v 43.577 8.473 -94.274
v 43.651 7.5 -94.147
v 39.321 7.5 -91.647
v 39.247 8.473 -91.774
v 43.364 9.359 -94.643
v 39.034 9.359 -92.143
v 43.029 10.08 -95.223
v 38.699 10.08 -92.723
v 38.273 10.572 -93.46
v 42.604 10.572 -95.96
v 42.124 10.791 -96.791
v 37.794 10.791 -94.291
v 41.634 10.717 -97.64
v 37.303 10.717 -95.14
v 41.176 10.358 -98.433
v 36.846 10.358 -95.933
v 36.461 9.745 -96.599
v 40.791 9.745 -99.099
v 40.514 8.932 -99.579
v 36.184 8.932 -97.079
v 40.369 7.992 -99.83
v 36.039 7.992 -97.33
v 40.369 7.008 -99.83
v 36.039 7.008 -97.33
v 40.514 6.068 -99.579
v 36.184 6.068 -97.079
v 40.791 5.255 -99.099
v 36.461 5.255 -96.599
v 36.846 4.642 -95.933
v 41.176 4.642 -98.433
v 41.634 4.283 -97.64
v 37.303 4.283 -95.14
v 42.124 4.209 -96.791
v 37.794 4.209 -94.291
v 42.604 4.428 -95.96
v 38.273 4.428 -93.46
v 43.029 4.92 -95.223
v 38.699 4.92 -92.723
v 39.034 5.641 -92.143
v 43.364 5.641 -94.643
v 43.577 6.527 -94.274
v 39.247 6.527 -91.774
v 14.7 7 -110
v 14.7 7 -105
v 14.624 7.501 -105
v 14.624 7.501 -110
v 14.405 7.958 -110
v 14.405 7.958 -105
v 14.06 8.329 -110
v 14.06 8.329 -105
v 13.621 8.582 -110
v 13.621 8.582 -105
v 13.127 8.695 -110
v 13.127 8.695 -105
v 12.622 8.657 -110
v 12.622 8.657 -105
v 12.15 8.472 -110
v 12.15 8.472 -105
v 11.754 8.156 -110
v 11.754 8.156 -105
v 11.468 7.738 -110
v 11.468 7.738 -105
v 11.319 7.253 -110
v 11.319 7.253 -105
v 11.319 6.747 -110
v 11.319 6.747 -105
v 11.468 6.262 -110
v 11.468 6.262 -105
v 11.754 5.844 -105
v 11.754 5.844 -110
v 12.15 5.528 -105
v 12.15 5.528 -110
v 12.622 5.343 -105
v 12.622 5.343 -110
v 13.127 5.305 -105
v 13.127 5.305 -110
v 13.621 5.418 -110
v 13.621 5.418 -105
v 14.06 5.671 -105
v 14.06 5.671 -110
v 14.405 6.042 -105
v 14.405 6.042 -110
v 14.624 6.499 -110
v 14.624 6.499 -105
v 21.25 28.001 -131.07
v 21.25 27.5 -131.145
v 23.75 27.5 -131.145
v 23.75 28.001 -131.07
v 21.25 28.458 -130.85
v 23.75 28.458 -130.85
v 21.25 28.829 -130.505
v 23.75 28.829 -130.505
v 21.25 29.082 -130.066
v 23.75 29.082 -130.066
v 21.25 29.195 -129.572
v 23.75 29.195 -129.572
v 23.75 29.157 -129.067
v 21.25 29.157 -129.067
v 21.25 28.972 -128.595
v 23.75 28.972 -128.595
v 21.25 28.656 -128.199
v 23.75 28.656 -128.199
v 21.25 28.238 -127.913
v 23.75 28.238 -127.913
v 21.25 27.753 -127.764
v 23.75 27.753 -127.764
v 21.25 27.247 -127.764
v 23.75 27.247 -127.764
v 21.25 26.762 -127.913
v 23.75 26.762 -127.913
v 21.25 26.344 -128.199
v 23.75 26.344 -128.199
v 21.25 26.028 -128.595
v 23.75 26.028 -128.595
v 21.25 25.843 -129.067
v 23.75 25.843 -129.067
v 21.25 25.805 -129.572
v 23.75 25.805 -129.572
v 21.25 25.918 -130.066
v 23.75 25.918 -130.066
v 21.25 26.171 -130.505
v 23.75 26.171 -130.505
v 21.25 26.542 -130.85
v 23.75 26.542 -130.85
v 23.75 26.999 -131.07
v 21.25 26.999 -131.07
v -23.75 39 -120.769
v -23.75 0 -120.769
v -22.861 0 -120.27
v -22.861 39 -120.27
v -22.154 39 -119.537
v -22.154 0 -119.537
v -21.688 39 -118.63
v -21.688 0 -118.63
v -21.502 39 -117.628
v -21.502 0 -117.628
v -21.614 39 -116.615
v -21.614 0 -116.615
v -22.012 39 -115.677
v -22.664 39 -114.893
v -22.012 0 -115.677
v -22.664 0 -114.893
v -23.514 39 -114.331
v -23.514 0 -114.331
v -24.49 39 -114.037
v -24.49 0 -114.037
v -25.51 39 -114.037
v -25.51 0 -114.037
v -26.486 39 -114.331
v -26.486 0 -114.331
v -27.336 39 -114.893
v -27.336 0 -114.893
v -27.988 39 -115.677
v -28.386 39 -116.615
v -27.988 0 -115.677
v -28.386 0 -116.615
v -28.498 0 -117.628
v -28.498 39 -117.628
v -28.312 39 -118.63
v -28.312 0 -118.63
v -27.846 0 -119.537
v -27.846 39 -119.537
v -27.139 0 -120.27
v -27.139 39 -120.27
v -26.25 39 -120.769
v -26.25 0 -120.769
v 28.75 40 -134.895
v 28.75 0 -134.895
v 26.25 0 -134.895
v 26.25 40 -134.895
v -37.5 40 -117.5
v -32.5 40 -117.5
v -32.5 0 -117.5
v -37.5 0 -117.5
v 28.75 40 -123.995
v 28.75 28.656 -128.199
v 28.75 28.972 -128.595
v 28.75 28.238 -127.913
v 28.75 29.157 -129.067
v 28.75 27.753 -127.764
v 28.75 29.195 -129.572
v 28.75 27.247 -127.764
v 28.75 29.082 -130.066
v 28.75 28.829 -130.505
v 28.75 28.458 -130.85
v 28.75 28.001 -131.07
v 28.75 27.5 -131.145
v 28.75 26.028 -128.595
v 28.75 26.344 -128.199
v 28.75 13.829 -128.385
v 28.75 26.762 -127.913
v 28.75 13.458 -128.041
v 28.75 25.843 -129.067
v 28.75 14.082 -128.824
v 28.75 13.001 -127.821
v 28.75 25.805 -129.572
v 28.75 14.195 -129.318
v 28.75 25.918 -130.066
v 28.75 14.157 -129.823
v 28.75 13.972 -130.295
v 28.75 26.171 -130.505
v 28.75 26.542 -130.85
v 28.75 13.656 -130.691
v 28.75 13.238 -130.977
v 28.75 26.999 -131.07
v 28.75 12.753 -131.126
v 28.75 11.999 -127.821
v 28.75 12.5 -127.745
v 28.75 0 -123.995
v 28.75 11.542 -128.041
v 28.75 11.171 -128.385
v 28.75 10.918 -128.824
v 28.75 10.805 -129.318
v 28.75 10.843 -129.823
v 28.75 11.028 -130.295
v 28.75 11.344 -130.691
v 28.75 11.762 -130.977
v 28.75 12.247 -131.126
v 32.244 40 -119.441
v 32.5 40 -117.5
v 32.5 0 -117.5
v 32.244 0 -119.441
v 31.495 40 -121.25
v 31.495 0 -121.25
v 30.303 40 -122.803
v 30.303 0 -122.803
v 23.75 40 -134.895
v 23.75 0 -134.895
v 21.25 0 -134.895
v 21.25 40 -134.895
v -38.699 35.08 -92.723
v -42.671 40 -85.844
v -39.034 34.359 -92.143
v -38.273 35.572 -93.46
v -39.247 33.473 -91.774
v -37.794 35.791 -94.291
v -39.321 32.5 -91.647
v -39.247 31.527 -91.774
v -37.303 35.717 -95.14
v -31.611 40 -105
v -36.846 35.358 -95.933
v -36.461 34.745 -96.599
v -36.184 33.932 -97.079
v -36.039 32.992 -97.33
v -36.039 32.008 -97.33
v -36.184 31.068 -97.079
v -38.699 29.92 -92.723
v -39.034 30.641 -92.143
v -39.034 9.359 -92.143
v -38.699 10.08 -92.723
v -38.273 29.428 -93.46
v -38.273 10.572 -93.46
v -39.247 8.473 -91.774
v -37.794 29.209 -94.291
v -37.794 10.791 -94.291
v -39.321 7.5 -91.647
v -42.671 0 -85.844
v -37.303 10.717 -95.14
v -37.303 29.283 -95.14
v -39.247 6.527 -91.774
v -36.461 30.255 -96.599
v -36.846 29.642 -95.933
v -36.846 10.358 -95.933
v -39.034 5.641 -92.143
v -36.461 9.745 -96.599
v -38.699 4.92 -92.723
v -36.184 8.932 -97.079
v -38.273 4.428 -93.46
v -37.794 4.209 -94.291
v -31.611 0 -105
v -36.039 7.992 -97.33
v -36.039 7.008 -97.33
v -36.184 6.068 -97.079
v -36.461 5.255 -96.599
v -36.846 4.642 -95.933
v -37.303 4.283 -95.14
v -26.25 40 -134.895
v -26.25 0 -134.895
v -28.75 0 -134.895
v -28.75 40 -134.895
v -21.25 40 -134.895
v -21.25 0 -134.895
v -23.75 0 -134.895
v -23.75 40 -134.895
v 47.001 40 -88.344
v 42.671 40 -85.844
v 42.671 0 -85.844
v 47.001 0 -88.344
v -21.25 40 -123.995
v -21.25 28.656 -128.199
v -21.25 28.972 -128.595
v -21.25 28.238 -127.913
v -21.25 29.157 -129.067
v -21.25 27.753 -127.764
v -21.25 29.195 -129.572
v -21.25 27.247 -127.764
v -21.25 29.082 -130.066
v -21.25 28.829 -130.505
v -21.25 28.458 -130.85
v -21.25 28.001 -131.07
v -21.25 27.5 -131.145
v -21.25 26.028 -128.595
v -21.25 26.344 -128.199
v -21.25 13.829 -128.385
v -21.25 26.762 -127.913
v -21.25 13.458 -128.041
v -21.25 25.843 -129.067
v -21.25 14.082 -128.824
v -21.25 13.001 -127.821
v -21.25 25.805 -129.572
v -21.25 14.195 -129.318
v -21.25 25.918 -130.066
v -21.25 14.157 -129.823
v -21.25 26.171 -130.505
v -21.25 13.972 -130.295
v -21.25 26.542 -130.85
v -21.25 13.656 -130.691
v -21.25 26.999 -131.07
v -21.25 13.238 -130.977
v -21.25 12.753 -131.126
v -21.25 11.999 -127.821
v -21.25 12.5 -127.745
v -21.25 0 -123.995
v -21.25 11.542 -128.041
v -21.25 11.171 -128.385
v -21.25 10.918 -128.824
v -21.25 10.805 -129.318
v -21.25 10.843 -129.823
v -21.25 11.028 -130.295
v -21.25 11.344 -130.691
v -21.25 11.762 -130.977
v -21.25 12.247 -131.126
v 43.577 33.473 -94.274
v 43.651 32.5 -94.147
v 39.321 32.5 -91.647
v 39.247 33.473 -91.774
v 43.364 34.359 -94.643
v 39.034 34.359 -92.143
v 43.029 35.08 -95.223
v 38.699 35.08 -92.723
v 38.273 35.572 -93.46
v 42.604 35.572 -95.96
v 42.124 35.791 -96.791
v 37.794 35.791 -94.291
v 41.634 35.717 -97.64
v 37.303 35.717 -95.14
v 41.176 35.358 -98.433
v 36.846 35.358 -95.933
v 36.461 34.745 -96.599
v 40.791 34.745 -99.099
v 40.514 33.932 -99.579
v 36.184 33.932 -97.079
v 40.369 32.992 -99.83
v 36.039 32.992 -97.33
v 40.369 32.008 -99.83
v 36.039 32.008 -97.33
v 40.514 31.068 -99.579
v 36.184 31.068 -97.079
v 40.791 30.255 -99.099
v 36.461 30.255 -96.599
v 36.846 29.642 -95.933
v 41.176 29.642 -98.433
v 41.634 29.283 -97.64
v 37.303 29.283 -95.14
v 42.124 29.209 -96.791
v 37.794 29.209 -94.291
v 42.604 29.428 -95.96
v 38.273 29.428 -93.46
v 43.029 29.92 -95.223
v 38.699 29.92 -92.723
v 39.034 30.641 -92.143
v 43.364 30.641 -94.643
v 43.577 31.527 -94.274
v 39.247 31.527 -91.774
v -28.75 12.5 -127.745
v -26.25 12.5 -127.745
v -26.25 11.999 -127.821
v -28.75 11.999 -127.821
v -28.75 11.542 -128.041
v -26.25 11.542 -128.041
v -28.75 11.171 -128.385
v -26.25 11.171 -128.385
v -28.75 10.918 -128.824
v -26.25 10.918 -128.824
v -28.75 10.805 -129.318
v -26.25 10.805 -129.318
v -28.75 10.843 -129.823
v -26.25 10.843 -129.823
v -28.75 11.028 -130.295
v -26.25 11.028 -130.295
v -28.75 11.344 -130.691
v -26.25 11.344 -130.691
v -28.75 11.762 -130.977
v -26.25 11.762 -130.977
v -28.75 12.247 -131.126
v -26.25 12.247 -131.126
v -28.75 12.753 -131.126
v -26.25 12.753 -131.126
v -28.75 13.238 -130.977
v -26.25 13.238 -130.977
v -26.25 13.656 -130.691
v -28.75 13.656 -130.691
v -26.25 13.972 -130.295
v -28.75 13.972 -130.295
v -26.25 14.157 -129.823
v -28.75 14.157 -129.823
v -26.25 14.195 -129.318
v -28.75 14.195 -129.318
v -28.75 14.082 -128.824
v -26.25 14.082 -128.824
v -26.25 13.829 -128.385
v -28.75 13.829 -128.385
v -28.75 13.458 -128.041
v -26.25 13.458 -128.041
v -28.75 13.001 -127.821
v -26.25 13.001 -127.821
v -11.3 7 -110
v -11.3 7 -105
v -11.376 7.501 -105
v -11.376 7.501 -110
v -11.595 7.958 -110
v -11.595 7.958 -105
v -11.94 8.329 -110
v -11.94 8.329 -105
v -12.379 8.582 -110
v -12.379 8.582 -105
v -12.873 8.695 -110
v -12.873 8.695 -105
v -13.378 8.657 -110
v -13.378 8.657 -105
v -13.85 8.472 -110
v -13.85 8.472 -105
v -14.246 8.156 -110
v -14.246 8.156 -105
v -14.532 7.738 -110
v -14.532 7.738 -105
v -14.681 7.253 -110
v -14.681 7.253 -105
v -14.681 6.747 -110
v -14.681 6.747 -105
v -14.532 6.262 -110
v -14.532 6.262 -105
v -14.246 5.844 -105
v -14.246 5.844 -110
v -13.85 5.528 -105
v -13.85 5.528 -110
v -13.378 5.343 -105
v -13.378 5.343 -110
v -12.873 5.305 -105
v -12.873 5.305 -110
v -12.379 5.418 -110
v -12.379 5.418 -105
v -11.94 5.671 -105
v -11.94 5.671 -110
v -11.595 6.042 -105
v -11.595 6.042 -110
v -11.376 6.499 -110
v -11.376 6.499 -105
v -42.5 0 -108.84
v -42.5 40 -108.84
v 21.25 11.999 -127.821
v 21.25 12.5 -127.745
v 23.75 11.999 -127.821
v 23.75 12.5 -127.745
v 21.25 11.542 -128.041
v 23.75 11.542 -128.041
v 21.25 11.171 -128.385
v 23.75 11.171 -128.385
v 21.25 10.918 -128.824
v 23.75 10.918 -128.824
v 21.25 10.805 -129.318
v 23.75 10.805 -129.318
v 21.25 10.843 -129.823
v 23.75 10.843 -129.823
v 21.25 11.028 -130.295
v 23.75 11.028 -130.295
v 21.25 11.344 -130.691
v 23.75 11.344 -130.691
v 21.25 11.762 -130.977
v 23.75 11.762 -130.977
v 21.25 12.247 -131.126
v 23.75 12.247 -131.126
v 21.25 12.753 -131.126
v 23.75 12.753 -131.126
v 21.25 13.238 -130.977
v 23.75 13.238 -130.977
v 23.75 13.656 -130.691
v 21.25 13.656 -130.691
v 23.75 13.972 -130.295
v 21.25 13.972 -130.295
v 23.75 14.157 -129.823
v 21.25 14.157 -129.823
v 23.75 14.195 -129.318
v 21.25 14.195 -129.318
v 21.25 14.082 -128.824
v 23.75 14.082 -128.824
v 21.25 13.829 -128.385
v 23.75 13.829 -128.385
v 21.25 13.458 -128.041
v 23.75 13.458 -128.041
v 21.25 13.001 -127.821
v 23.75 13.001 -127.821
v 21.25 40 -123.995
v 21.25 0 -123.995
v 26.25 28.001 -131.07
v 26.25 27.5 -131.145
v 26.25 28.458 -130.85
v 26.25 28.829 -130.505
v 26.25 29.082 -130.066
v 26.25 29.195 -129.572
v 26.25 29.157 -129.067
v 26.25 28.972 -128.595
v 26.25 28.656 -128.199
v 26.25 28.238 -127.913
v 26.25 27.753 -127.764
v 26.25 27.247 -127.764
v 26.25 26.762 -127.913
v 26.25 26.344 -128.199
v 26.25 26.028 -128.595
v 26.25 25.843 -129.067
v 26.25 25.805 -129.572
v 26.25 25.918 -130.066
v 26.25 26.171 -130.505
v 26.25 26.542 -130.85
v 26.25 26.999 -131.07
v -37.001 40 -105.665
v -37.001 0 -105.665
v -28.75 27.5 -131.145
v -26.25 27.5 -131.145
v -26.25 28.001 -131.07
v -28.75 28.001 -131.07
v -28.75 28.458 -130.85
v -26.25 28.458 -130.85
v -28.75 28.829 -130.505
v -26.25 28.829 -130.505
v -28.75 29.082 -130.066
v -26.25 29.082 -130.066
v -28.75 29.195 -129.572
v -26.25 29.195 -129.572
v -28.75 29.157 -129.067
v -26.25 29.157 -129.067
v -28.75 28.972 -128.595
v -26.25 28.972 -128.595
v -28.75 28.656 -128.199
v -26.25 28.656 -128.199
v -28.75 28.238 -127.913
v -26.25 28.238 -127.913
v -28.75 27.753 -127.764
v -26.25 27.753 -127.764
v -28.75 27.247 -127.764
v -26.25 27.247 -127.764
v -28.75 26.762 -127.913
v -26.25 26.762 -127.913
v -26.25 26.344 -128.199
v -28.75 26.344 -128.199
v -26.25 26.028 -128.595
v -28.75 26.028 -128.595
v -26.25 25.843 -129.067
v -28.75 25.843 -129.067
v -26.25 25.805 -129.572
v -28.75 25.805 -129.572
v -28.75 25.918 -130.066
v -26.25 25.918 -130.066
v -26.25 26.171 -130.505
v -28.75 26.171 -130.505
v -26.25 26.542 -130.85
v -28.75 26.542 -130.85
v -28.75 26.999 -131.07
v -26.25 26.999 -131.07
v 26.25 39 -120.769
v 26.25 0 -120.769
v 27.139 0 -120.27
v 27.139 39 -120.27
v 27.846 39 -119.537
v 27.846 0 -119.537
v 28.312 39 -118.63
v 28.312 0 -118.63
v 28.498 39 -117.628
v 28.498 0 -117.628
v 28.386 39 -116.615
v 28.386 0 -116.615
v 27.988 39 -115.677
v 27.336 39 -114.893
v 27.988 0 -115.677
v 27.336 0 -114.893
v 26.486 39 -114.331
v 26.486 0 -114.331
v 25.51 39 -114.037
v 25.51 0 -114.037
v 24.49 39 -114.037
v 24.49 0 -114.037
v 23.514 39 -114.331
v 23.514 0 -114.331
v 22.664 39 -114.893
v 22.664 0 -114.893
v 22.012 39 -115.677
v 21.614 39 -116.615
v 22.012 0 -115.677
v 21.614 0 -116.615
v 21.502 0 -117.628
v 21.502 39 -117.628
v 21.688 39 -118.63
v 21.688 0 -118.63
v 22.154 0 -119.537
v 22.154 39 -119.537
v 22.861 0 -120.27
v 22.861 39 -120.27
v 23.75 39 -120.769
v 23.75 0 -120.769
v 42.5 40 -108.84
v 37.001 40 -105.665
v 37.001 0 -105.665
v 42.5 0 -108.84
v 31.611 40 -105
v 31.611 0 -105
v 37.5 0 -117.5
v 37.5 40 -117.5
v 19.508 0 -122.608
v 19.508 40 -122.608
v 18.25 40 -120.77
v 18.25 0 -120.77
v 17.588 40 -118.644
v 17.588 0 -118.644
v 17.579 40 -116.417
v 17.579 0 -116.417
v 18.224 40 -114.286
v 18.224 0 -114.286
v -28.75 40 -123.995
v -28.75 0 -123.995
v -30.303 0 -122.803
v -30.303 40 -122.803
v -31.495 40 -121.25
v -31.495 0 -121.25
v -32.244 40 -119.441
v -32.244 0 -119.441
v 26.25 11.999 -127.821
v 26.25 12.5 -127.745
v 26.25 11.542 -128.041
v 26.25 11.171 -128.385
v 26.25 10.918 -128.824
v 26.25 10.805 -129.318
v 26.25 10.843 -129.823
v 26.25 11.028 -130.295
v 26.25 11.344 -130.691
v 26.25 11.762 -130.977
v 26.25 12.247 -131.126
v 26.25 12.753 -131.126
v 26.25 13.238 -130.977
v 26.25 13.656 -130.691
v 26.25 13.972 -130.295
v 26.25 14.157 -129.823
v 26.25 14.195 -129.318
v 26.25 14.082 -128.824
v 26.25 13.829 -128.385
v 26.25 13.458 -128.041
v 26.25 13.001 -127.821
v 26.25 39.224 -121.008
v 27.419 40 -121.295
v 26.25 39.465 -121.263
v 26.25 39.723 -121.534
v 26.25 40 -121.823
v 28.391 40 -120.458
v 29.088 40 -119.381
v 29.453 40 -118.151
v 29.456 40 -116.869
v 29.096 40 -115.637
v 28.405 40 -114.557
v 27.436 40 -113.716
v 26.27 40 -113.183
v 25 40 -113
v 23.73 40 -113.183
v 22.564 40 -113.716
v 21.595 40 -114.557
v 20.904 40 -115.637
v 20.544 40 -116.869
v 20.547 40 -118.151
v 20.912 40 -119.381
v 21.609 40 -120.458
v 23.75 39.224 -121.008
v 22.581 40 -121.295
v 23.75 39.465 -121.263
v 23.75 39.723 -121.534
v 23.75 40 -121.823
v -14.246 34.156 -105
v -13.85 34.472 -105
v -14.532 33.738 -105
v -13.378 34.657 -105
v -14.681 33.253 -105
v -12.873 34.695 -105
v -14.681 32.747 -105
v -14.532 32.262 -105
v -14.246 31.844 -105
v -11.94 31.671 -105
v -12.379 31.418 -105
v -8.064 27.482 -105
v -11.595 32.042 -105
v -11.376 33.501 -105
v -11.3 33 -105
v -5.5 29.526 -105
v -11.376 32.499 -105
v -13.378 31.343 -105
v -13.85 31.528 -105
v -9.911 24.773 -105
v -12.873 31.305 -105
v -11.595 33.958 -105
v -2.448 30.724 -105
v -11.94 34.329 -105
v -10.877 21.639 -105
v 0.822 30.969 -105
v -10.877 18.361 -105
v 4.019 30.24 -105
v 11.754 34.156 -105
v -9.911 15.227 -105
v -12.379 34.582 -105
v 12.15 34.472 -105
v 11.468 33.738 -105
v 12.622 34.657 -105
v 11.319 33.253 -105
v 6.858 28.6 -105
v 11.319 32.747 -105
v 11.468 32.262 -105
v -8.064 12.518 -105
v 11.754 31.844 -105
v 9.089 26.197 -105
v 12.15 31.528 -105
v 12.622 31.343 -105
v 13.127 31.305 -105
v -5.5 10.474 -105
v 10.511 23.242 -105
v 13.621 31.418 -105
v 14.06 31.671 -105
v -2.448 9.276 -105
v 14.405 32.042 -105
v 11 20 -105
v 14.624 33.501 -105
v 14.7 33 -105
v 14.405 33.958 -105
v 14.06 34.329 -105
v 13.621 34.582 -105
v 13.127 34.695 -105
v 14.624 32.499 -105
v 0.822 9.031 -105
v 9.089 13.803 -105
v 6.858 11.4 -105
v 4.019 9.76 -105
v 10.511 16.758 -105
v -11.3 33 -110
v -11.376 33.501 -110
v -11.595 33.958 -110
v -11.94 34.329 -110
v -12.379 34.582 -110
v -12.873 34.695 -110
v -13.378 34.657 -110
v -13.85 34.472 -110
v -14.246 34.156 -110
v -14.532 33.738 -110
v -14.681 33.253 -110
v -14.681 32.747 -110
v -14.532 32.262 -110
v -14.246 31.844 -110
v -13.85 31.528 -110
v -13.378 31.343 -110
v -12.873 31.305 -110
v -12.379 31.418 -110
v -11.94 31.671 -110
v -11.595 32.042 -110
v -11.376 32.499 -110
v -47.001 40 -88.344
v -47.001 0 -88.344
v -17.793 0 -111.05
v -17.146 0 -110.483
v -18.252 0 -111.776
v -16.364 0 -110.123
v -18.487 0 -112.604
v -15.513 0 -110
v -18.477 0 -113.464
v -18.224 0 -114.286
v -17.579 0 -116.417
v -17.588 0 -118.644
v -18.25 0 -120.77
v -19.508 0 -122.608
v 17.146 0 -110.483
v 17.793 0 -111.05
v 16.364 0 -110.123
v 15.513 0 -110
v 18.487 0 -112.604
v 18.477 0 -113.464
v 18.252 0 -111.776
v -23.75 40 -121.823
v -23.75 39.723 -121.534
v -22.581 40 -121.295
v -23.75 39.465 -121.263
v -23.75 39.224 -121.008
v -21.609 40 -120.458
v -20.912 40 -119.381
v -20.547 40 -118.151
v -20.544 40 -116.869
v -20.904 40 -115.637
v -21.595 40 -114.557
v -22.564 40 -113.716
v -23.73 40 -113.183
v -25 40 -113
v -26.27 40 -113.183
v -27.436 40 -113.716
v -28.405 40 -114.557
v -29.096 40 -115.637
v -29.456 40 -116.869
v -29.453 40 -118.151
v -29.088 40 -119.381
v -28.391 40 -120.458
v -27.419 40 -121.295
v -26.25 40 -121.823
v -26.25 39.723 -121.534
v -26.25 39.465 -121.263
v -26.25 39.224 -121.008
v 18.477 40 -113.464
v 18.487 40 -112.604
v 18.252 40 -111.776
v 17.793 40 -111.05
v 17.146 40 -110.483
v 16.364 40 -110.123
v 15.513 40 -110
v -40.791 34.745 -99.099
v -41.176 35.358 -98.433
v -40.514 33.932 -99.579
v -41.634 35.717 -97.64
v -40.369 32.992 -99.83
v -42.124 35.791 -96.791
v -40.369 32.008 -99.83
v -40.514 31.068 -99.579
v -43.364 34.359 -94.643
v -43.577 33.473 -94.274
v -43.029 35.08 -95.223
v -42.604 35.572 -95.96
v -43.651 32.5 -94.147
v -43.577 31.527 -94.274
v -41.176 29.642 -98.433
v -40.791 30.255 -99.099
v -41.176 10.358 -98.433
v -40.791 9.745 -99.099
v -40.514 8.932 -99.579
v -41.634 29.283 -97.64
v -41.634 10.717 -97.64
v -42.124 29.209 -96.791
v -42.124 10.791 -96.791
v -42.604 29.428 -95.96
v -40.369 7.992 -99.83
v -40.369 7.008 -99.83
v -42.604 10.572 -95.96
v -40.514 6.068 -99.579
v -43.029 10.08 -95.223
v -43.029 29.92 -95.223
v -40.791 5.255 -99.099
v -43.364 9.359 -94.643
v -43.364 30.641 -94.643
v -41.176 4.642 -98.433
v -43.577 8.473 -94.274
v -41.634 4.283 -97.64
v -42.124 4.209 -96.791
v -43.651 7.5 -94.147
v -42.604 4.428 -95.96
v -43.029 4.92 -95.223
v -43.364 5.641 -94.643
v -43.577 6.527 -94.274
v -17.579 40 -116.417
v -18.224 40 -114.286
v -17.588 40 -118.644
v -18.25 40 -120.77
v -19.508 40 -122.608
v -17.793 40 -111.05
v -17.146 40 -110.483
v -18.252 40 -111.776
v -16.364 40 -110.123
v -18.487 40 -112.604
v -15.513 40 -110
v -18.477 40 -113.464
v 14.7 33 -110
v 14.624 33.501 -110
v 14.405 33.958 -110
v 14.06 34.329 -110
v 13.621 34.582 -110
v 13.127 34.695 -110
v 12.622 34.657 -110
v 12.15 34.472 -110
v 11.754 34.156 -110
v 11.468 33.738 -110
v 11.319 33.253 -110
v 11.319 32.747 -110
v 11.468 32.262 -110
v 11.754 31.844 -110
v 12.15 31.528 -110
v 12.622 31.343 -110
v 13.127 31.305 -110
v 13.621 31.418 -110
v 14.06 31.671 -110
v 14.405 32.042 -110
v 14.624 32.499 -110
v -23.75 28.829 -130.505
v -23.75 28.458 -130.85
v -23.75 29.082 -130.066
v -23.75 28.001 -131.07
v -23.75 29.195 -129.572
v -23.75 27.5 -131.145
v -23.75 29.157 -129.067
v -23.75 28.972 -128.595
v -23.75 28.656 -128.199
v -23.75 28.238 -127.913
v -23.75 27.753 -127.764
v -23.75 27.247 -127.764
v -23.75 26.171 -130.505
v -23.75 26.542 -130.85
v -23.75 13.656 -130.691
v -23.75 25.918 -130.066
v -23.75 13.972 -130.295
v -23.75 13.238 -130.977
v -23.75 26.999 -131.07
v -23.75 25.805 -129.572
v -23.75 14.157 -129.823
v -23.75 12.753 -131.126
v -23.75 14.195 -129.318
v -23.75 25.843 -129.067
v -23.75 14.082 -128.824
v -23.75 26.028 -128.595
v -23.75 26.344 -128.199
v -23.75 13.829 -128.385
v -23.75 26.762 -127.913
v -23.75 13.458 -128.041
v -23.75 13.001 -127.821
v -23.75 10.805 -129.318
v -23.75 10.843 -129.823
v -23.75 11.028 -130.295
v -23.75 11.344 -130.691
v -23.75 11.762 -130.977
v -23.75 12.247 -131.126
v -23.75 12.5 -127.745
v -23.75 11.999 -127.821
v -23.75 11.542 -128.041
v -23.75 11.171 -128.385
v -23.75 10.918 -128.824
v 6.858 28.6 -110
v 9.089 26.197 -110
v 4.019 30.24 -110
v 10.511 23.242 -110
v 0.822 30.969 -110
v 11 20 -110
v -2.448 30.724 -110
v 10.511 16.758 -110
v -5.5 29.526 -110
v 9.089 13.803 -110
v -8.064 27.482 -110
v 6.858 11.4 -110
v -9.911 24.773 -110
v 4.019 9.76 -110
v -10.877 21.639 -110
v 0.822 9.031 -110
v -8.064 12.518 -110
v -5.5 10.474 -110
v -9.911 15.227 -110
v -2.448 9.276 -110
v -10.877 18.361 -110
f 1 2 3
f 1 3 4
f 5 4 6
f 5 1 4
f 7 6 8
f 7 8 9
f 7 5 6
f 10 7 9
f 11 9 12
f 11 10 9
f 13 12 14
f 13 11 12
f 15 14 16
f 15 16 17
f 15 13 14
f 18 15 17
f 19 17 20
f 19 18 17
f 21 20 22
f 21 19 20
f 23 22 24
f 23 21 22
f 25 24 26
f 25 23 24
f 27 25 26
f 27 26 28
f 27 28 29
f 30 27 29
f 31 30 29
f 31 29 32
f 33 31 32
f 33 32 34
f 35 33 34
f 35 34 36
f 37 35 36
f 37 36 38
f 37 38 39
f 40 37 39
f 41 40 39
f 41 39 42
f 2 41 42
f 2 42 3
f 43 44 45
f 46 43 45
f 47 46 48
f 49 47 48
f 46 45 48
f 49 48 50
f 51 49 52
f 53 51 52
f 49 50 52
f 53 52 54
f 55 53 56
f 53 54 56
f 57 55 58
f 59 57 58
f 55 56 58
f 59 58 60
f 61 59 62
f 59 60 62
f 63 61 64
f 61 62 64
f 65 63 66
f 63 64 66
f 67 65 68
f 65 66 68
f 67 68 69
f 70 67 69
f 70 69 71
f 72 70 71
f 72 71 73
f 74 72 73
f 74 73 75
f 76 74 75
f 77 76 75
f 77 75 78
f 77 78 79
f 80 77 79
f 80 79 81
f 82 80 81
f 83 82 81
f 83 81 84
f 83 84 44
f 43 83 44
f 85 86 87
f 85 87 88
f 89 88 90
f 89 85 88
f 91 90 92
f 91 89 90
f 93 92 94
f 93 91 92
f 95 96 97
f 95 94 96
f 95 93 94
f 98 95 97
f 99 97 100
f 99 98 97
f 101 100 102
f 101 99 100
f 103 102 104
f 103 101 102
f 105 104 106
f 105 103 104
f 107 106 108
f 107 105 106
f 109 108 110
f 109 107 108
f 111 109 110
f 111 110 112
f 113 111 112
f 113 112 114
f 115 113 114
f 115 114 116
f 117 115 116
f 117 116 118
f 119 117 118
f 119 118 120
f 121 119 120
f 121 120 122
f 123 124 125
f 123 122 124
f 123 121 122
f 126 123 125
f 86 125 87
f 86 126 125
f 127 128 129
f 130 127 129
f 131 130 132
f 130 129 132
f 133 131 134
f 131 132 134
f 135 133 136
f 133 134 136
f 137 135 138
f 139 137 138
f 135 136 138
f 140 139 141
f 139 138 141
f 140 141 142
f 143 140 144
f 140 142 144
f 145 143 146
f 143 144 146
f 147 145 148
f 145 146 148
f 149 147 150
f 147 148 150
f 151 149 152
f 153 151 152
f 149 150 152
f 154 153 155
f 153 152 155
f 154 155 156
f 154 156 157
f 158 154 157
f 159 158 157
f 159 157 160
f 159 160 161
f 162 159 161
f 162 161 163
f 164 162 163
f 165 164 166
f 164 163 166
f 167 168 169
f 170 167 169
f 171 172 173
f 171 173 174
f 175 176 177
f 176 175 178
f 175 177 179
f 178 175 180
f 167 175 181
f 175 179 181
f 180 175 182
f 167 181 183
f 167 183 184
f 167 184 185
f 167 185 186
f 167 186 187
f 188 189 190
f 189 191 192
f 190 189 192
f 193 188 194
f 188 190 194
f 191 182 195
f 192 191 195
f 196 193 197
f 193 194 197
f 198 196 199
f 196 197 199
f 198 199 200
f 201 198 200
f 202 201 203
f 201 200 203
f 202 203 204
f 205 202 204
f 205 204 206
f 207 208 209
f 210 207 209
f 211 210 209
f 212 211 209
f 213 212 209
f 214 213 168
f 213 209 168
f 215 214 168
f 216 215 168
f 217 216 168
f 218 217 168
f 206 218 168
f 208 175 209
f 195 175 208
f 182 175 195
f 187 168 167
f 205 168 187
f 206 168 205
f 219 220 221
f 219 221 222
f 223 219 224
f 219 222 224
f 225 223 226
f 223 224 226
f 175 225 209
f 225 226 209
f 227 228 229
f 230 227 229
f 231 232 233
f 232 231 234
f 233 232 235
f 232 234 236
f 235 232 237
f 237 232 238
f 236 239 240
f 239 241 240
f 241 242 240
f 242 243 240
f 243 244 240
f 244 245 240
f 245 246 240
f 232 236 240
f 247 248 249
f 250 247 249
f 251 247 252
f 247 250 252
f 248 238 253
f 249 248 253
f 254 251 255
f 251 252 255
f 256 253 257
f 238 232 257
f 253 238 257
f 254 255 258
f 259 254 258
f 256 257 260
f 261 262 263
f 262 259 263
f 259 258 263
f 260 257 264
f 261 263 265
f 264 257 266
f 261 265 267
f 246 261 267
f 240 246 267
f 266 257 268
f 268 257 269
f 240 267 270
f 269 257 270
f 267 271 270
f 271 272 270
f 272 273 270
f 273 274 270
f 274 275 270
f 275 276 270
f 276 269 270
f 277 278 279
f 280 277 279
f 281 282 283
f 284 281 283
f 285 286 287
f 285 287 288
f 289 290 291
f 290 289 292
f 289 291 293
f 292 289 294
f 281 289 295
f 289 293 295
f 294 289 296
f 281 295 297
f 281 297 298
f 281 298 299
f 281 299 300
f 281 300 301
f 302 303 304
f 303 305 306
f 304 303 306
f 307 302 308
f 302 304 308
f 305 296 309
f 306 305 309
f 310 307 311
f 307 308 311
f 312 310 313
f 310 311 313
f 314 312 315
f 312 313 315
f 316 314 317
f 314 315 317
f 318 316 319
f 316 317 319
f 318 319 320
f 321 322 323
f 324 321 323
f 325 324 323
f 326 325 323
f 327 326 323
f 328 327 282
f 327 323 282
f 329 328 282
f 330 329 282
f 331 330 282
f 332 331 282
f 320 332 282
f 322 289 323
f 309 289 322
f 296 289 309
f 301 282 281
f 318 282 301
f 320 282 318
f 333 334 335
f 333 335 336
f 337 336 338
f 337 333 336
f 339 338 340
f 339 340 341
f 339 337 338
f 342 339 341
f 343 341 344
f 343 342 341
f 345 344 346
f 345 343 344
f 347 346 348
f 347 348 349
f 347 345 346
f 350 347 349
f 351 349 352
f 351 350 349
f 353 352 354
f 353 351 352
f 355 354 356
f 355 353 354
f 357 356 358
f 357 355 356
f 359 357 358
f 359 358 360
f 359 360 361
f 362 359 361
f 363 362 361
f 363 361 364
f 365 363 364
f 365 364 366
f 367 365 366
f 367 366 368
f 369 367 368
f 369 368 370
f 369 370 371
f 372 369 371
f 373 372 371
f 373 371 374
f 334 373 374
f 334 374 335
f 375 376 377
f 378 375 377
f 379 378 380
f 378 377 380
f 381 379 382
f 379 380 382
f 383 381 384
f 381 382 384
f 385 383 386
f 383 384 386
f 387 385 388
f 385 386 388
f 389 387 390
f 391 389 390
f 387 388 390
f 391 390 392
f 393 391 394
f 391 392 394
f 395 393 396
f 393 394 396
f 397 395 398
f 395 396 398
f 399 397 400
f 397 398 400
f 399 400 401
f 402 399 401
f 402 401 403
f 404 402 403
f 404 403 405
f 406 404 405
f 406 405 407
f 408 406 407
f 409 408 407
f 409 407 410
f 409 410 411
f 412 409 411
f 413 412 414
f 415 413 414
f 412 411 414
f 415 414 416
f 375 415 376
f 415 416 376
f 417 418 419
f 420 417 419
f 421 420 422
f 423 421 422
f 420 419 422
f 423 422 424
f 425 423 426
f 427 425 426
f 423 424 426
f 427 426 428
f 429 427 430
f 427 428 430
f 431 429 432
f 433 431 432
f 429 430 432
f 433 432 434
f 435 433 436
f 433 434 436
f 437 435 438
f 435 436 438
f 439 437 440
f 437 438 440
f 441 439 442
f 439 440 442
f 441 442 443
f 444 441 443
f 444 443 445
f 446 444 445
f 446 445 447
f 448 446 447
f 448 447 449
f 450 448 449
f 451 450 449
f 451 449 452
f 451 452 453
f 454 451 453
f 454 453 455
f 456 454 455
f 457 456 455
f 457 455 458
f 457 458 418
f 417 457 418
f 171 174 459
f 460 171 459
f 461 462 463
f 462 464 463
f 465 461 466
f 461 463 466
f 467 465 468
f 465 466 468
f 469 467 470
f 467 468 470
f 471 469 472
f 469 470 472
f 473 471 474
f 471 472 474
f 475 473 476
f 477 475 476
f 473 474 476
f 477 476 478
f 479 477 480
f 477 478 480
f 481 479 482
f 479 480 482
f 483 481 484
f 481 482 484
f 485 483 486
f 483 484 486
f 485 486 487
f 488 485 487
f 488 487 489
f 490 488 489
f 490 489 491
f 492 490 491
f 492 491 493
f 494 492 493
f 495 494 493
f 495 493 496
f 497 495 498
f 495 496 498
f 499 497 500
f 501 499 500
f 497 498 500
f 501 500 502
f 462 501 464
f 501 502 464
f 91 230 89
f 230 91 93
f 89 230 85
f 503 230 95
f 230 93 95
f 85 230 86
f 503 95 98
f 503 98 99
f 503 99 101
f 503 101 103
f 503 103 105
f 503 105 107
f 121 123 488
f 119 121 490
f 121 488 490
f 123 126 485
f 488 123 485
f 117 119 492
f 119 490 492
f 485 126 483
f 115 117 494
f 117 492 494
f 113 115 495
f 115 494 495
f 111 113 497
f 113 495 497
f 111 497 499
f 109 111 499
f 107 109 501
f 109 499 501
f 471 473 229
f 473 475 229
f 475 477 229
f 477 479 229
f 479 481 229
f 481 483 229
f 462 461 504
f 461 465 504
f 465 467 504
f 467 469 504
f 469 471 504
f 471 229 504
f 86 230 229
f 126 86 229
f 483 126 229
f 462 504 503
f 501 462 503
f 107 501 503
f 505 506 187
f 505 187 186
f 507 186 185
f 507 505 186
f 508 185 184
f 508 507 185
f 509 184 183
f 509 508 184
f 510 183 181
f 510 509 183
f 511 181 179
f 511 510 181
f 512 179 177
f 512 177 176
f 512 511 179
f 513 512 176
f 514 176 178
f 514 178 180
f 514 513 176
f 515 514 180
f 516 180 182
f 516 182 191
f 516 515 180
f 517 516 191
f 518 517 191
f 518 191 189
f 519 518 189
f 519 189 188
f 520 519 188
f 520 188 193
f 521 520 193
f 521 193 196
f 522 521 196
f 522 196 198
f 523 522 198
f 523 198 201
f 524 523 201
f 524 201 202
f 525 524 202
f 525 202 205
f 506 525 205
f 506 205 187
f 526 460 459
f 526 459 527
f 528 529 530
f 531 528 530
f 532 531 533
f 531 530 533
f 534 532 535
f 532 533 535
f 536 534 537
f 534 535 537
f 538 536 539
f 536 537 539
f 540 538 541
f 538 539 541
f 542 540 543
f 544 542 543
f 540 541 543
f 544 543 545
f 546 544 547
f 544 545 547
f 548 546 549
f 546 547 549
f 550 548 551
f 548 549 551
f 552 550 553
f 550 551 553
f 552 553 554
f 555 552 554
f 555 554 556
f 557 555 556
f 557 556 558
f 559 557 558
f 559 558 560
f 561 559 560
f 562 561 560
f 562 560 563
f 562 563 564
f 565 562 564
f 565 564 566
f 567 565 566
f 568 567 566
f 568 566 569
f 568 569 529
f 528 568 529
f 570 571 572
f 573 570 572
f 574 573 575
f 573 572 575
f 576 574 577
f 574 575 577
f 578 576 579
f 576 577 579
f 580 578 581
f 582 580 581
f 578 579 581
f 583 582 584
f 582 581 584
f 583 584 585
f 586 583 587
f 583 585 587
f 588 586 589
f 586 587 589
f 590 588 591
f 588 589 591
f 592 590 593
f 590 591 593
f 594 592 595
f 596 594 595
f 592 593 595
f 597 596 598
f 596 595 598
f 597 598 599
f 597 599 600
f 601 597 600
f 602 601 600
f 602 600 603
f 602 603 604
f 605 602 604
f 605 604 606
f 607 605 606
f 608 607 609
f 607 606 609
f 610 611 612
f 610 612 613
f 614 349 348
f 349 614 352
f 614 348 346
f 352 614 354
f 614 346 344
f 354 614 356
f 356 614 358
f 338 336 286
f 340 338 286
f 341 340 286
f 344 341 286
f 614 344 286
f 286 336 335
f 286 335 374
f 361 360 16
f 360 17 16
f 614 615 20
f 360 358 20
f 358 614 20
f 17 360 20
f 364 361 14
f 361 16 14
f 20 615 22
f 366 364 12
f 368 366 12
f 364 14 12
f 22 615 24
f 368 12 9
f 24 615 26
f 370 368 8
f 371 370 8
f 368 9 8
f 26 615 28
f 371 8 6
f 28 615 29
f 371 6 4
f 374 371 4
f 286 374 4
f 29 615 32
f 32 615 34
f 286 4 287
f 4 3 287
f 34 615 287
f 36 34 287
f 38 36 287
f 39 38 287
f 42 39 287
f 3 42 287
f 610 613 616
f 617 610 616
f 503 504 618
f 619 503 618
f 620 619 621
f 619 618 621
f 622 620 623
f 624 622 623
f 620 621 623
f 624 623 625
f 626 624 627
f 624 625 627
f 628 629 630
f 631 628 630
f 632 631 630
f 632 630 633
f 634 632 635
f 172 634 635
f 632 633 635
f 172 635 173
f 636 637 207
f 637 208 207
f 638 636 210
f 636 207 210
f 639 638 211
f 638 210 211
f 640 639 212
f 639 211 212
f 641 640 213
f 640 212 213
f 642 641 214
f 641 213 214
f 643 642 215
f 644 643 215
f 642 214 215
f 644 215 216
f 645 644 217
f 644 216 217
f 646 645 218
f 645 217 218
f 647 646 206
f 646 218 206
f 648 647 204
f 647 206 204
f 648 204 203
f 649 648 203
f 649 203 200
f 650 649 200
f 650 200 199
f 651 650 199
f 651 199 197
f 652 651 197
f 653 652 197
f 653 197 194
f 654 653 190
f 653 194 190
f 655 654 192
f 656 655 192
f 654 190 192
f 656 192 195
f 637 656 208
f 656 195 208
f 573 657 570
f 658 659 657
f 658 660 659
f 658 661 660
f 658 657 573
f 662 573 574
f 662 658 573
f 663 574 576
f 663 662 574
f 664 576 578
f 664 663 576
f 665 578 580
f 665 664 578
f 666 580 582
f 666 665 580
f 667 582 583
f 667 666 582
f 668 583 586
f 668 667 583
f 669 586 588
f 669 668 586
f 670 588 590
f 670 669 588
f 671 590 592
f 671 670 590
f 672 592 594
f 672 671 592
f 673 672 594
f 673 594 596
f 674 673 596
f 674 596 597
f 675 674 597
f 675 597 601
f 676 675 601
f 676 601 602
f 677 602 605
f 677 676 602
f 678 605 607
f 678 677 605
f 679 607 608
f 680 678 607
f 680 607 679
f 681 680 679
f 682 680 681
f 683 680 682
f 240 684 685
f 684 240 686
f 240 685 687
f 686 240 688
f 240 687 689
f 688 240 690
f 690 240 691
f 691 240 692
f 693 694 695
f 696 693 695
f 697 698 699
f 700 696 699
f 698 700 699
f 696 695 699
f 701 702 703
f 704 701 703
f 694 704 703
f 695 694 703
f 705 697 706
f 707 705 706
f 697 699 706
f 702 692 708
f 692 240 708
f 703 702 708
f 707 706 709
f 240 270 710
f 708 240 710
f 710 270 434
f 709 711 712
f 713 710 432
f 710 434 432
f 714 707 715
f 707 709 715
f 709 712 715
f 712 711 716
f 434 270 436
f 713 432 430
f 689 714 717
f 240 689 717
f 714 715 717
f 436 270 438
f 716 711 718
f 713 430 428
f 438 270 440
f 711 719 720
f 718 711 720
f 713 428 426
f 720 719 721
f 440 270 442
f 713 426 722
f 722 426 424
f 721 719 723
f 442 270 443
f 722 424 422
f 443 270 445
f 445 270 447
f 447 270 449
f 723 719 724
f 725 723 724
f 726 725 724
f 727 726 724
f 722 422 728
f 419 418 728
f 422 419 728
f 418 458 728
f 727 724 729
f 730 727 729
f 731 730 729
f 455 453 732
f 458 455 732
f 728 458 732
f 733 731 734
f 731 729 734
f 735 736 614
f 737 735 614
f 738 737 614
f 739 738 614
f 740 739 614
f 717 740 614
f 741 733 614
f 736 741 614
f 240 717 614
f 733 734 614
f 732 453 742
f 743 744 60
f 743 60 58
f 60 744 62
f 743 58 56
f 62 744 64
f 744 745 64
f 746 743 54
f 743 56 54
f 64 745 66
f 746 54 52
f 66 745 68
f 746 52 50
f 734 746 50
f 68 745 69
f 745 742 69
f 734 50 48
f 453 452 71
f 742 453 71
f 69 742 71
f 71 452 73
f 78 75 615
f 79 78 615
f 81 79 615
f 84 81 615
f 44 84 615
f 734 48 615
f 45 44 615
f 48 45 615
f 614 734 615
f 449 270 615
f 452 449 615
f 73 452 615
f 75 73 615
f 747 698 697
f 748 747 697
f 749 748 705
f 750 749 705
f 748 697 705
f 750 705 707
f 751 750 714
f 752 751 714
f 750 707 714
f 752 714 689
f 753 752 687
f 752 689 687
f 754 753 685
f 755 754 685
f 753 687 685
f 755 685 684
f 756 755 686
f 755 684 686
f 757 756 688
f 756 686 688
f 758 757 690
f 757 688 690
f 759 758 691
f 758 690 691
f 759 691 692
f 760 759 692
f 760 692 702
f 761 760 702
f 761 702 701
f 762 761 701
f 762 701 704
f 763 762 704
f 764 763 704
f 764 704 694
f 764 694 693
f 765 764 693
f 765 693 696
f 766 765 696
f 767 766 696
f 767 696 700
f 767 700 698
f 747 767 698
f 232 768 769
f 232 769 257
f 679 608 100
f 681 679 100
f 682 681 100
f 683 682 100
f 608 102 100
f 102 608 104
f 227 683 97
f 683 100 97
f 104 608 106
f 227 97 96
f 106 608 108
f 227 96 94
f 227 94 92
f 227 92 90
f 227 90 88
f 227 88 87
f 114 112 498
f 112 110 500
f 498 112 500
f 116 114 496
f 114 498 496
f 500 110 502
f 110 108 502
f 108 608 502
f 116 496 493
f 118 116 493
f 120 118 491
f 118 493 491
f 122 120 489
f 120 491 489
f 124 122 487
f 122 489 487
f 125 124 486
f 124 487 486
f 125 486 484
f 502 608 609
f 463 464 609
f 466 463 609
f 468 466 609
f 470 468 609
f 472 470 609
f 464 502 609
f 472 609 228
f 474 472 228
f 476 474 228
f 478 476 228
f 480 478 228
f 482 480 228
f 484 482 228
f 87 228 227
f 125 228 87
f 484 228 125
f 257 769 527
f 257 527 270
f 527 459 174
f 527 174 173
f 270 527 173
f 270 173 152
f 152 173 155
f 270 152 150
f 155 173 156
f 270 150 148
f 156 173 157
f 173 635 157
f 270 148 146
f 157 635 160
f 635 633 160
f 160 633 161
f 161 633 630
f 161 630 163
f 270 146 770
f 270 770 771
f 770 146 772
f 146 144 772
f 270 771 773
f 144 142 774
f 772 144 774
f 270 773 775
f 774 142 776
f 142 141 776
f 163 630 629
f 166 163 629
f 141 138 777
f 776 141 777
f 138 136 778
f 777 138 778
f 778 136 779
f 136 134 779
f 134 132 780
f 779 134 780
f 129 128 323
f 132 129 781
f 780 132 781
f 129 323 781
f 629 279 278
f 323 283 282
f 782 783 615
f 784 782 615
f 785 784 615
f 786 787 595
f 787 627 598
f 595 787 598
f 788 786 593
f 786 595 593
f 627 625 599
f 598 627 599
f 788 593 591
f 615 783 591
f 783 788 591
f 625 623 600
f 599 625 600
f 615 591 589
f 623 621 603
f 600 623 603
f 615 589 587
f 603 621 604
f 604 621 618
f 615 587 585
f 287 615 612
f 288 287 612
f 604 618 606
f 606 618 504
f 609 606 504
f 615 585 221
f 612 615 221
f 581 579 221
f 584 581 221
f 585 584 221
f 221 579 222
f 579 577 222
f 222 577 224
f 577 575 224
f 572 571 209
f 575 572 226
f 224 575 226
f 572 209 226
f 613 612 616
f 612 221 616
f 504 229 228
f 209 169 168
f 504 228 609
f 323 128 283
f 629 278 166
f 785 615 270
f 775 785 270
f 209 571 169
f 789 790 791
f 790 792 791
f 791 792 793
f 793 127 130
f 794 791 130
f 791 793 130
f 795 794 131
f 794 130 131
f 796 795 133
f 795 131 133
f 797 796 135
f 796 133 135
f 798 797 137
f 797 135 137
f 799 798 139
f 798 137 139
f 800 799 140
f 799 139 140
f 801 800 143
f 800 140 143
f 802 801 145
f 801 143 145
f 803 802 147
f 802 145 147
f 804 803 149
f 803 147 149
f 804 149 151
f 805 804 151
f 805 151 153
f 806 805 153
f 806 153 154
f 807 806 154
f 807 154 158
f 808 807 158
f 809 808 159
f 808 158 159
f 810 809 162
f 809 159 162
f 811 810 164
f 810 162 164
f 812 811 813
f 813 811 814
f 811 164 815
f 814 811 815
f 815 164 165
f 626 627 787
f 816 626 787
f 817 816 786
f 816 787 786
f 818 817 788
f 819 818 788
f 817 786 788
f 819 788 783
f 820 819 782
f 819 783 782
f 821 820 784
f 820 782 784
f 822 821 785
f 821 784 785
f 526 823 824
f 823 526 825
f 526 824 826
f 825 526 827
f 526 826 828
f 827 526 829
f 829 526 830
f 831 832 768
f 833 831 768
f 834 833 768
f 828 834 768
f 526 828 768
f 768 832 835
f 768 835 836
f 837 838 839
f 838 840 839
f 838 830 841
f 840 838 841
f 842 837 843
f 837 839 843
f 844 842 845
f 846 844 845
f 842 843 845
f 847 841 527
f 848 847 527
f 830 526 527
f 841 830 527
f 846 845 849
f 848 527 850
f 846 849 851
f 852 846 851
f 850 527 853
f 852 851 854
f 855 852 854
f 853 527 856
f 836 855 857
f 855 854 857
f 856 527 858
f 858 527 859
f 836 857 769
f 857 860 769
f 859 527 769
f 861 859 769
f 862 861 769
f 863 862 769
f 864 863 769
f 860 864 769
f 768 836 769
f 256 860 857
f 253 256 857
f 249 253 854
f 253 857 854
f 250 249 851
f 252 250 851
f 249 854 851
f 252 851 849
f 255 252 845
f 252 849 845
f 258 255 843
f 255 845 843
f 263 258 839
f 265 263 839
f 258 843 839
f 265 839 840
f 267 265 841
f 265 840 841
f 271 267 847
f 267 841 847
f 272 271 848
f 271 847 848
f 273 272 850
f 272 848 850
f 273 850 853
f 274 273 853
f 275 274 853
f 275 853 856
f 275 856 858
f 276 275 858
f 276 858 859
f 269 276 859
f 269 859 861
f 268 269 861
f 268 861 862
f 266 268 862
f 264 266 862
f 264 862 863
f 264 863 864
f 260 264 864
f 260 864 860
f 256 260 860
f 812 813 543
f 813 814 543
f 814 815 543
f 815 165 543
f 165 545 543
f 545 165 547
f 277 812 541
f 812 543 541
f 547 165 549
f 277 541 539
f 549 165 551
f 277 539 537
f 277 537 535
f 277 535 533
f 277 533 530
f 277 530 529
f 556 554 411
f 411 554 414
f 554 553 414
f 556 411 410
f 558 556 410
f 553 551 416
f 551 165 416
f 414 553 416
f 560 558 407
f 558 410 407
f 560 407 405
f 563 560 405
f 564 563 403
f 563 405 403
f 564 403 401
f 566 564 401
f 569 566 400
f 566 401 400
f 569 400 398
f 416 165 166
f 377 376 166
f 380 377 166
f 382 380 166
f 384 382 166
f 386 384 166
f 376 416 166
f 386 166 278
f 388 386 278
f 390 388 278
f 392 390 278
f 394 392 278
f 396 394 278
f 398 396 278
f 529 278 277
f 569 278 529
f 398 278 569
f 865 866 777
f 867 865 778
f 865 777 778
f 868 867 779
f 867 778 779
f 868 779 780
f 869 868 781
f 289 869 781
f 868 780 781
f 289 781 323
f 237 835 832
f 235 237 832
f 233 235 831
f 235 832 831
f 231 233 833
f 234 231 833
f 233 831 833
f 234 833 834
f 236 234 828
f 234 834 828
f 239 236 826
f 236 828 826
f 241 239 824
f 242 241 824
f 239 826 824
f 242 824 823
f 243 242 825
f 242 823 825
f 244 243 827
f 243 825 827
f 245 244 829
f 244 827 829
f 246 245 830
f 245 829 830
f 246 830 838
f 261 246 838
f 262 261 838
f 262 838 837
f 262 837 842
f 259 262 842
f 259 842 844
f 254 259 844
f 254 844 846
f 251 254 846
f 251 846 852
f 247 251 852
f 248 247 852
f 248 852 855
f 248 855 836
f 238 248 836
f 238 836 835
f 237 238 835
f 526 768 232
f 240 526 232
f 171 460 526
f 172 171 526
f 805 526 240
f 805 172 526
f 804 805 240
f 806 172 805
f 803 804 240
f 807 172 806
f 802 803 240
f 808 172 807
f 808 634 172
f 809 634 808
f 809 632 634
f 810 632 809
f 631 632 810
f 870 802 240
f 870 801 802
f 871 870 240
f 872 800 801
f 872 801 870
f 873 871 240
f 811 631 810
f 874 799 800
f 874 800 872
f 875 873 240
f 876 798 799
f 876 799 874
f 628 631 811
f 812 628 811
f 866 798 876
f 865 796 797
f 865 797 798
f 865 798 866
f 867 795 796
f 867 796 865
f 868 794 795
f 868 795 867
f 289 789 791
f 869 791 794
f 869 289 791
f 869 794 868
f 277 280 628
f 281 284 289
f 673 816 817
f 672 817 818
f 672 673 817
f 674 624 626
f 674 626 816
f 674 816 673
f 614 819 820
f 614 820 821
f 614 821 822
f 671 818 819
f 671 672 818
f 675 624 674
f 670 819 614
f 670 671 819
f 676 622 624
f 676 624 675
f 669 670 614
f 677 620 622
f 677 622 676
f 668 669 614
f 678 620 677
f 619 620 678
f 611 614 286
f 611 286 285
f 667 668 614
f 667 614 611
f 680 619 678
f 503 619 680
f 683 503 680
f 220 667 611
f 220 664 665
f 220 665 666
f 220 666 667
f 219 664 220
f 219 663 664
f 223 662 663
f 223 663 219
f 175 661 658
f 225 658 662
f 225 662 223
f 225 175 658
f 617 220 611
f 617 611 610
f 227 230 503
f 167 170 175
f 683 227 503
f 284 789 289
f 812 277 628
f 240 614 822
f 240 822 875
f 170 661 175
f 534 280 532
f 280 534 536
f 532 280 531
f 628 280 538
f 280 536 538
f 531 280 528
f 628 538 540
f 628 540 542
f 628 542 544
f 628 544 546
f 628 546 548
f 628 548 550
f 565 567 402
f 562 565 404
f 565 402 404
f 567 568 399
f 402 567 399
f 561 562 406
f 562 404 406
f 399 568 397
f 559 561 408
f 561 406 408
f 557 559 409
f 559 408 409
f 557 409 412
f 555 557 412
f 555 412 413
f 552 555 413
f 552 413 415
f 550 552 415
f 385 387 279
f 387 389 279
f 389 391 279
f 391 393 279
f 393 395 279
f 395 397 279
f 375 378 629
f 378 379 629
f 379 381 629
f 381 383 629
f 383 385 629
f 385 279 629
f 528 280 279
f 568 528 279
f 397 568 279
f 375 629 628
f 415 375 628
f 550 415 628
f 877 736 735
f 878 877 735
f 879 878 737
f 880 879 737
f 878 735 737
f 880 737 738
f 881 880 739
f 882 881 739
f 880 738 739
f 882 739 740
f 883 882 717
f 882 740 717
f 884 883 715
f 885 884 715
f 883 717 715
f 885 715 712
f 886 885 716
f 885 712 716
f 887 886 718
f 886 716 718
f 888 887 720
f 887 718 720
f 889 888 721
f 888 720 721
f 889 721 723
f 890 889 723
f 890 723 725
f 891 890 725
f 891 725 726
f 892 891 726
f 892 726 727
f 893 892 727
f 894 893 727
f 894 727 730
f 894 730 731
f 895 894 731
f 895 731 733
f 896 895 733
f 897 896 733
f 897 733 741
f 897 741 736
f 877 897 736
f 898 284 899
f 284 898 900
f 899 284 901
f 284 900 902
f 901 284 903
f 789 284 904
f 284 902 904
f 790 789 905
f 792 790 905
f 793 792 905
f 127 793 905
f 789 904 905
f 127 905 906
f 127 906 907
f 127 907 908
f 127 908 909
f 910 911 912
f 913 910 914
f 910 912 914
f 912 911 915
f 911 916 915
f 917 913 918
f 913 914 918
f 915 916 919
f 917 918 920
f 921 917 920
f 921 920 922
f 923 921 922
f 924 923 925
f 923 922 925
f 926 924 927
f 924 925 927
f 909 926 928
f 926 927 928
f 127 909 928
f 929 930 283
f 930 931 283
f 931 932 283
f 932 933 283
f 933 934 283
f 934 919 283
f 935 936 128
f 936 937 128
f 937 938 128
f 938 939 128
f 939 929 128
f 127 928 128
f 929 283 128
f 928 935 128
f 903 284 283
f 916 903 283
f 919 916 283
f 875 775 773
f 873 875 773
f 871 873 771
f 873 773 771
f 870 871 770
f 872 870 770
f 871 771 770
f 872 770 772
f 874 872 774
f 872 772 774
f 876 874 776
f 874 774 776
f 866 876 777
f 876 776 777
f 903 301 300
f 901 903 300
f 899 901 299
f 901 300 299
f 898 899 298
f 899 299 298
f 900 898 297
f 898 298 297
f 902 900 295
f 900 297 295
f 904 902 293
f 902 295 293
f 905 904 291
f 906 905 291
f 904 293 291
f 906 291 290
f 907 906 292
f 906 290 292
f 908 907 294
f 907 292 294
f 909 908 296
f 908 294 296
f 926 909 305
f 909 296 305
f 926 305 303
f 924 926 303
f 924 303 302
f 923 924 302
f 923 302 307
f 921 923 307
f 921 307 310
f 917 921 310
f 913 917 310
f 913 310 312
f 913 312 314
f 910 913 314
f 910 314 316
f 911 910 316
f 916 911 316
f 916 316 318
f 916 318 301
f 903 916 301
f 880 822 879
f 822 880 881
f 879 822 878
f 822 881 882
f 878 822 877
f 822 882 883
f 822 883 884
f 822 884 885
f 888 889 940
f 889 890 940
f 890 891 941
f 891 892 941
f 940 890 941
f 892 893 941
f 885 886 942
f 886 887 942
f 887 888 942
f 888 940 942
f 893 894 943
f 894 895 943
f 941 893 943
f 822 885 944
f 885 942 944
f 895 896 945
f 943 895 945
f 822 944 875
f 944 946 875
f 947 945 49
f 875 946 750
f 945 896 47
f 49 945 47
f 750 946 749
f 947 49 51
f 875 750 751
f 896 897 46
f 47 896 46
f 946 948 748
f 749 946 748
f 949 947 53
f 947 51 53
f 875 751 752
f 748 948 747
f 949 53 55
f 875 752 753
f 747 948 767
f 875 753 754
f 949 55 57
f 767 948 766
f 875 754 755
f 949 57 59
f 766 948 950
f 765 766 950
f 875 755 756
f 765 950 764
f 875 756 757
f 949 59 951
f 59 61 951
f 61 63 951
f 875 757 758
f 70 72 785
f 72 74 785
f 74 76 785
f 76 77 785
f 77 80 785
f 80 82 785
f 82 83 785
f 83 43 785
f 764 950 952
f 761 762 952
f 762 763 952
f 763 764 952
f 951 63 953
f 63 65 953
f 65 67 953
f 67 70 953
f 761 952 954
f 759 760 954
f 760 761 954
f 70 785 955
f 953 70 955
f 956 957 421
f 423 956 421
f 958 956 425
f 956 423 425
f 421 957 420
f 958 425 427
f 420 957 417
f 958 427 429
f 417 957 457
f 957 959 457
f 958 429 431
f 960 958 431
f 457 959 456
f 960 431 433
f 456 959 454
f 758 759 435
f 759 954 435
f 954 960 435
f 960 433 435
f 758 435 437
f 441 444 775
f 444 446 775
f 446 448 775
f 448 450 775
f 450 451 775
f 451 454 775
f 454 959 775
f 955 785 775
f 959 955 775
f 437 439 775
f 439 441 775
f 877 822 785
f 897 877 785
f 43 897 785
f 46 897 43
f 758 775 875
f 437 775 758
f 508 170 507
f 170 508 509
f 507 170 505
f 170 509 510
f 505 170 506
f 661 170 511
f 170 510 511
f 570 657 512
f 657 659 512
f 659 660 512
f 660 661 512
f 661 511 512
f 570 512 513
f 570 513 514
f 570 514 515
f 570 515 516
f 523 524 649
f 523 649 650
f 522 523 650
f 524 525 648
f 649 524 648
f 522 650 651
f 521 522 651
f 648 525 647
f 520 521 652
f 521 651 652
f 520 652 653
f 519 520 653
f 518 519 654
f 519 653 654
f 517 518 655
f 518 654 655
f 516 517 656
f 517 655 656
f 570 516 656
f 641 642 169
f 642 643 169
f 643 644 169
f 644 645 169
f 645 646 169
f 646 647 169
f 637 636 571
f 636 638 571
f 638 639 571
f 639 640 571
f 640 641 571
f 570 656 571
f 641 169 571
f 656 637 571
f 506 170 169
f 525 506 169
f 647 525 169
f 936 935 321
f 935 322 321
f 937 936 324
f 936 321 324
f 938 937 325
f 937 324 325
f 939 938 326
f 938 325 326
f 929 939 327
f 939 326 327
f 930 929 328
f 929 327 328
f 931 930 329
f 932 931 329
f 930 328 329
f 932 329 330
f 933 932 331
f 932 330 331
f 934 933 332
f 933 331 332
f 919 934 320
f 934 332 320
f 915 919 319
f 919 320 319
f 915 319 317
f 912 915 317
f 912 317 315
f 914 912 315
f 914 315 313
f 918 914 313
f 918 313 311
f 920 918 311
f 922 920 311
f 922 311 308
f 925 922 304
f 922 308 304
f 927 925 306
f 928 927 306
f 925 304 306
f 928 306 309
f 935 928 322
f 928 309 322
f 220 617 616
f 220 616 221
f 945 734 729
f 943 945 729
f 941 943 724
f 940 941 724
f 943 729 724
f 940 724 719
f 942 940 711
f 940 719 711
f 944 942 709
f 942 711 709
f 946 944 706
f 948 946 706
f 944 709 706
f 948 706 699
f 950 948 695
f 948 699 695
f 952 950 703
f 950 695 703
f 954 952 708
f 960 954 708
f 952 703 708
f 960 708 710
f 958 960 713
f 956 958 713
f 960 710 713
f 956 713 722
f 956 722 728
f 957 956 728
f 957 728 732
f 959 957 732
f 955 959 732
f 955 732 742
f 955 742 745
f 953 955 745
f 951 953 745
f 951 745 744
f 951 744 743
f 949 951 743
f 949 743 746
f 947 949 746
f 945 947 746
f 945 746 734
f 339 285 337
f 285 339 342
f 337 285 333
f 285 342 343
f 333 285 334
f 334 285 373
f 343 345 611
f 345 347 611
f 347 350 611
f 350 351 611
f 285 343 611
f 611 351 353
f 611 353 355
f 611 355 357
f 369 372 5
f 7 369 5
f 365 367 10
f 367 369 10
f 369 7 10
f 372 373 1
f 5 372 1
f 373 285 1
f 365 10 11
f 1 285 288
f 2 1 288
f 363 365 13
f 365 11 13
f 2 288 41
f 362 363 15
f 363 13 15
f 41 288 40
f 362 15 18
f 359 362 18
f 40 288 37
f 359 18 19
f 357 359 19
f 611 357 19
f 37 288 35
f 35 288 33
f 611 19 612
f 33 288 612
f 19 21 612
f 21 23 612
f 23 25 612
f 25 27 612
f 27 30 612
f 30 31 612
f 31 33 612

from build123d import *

# Parameters (mm, degrees)
BOSS_EXTRUDE1_DEPTH = 40
SKETCH2_R           = 1.7
CUT_EXTRUDE1_DEPTH  = 28.75
SKETCH4_R           = 1.7
SKETCH4_R_2         = 11
CUT_EXTRUDE2_DEPTH  = 20
CHAMFER1_SIZE       = 1
CUT_EXTRUDE3_REACH  = 159.067
SKETCH5_R           = 3.3


with BuildPart() as part:
    # Sketch1 → Boss-Extrude1 (new body)
    with BuildSketch(Plane(origin=(0, 0, 0), x_dir=(1, 0, 0), z_dir=(0, 1, 0))):
        with BuildLine():
            Line((23.75, 120.769174208), (23.75, 134.895099729))
            Line((23.75, 134.895099729), (21.25, 134.895099729))
            Line((21.25, 134.895099729), (21.25, 123.995190528))
            ThreePointArc((21.25, 123.995190528), (17.839743095, 119.73175291), (18.223690728, 114.285714286))
            ThreePointArc((18.223690728, 114.285714286), (18.048629784, 111.396432549), (15.513167019, 110))
            Line((15.513167019, 110), (-15.513167019, 110))
            ThreePointArc((-15.513167019, 110), (-18.048629784, 111.396432549), (-18.223690728, 114.285714286))
            ThreePointArc((-18.223690728, 114.285714286), (-17.839743095, 119.73175291), (-21.25, 123.995190528))
            Line((-21.25, 123.995190528), (-21.25, 134.895099729))
            Line((-21.25, 134.895099729), (-23.75, 134.895099729))
            Line((-23.75, 134.895099729), (-23.75, 120.769174208))
            ThreePointArc((-23.75, 120.769174208), (-25, 114), (-26.25, 120.769174208))
            Line((-26.25, 120.769174208), (-26.25, 134.895099729))
            Line((-26.25, 134.895099729), (-28.75, 134.895099729))
            Line((-28.75, 134.895099729), (-28.75, 123.995190528))
            ThreePointArc((-28.75, 123.995190528), (-31.495190528, 121.25), (-32.5, 117.5))
            Line((-32.5, 117.5), (-37.5, 117.5))
            Line((-37.5, 117.5), (-42.5, 108.839745962))
            Line((-42.5, 108.839745962), (-37.000738686, 105.664745962))
            Line((-37.000738686, 105.664745962), (-47.000738686, 88.344237886))
            Line((-47.000738686, 88.344237886), (-42.670611667, 85.844237886))
            Line((-42.670611667, 85.844237886), (-31.611027254, 105))
            Line((-31.611027254, 105), (31.611027254, 105))
            Line((31.611027254, 105), (42.670611667, 85.844237886))
            Line((42.670611667, 85.844237886), (47.000738686, 88.344237886))
            Line((47.000738686, 88.344237886), (37.000738686, 105.664745962))
            Line((37.000738686, 105.664745962), (42.5, 108.839745962))
            Line((42.5, 108.839745962), (37.5, 117.5))
            Line((37.5, 117.5), (32.5, 117.5))
            ThreePointArc((32.5, 117.5), (31.495190528, 121.25), (28.75, 123.995190528))
            Line((28.75, 123.995190528), (28.75, 134.895099729))
            Line((28.75, 134.895099729), (26.25, 134.895099729))
            Line((26.25, 134.895099729), (26.25, 120.769174208))
            ThreePointArc((26.25, 120.769174208), (25, 114), (23.75, 120.769174208))
        make_face()
    extrude(amount=BOSS_EXTRUDE1_DEPTH)

    # Sketch2 → Cut-Extrude1 (cut, symmetric)
    with BuildSketch(Plane(origin=(0, 0, 0), x_dir=(0, 0, -1), z_dir=(1, 0, 0))):
        with Locations((129.445145129, 27.5)):
            Circle(SKETCH2_R)
        with Locations(Location((129.445145129, 12.5, 0), (0, 0, 180))):
            Circle(SKETCH2_R)
    extrude(amount=CUT_EXTRUDE1_DEPTH, both=True, mode=Mode.SUBTRACT)

    # Sketch4 → Cut-Extrude2 (cut)
    with BuildSketch(Plane.XY.offset(-105)):
        with Locations((-13, 33)):
            Circle(SKETCH4_R)
        with Locations((0, 20)):
            Circle(SKETCH4_R_2)
        with Locations((13, 33)):
            Circle(SKETCH4_R)
        with Locations((13, 7)):
            Circle(SKETCH4_R)
        with Locations((-13, 7)):
            Circle(SKETCH4_R)
    extrude(amount=-CUT_EXTRUDE2_DEPTH, mode=Mode.SUBTRACT)

    # Chamfer1
    chamfer1_edges = [part.edges().sort_by_distance(p)[0] for p in [
        (25, 40, -114),
        (-25, 40, -114),
    ]]
    chamfer(chamfer1_edges, length=CHAMFER1_SIZE)

    # Sketch5 → Cut-Extrude3 (cut, up to next)
    with BuildSketch(Plane(origin=(-73.504731158, 0, -42.437976321), x_dir=(-0.49999999999998673, 0, 0.8660254037844464), z_dir=(-0.8660254037844464, 0, -0.49999999999998673)), mode=Mode.PRIVATE) as cut_extrude3_sk1:
        with Locations((-63.007984945, 32.5)):
            Circle(SKETCH5_R)
    cut_extrude3_tool1 = extrude(cut_extrude3_sk1.sketch, amount=-CUT_EXTRUDE3_REACH, mode=Mode.PRIVATE) & part.part
    # Sketch5 → Cut-Extrude3 (cut, up to next)
    with BuildSketch(Plane(origin=(-73.504731158, 0, -42.437976321), x_dir=(-0.49999999999998673, 0, 0.8660254037844464), z_dir=(-0.8660254037844464, 0, -0.49999999999998673)), mode=Mode.PRIVATE) as cut_extrude3_sk2:
        with Locations((-63.007984945, 7.5)):
            Circle(SKETCH5_R)
    cut_extrude3_tool2 = extrude(cut_extrude3_sk2.sketch, amount=-CUT_EXTRUDE3_REACH, mode=Mode.PRIVATE) & part.part
    cut_extrude3_1 = cut_extrude3_tool1.solids().sort_by_distance((-42.000739, 32.5, -97.004492))[0]
    add(cut_extrude3_1, mode=Mode.SUBTRACT)
    cut_extrude3_2 = cut_extrude3_tool2.solids().sort_by_distance((-42.000739, 7.5, -97.004492))[0]
    add(cut_extrude3_2, mode=Mode.SUBTRACT)
    cut_extrude3 = cut_extrude3_1 + cut_extrude3_2  # Cut-Extrude3 as one shape, for the pattern or mirror that repeats it

    # Mirror1: Cut-Extrude3 across plane
    add(cut_extrude3.mirror(Plane(origin=(0, 0, 0), x_dir=(0, 0, 1), z_dir=(1, 0, 0))), mode=Mode.SUBTRACT)


solid = part.part
